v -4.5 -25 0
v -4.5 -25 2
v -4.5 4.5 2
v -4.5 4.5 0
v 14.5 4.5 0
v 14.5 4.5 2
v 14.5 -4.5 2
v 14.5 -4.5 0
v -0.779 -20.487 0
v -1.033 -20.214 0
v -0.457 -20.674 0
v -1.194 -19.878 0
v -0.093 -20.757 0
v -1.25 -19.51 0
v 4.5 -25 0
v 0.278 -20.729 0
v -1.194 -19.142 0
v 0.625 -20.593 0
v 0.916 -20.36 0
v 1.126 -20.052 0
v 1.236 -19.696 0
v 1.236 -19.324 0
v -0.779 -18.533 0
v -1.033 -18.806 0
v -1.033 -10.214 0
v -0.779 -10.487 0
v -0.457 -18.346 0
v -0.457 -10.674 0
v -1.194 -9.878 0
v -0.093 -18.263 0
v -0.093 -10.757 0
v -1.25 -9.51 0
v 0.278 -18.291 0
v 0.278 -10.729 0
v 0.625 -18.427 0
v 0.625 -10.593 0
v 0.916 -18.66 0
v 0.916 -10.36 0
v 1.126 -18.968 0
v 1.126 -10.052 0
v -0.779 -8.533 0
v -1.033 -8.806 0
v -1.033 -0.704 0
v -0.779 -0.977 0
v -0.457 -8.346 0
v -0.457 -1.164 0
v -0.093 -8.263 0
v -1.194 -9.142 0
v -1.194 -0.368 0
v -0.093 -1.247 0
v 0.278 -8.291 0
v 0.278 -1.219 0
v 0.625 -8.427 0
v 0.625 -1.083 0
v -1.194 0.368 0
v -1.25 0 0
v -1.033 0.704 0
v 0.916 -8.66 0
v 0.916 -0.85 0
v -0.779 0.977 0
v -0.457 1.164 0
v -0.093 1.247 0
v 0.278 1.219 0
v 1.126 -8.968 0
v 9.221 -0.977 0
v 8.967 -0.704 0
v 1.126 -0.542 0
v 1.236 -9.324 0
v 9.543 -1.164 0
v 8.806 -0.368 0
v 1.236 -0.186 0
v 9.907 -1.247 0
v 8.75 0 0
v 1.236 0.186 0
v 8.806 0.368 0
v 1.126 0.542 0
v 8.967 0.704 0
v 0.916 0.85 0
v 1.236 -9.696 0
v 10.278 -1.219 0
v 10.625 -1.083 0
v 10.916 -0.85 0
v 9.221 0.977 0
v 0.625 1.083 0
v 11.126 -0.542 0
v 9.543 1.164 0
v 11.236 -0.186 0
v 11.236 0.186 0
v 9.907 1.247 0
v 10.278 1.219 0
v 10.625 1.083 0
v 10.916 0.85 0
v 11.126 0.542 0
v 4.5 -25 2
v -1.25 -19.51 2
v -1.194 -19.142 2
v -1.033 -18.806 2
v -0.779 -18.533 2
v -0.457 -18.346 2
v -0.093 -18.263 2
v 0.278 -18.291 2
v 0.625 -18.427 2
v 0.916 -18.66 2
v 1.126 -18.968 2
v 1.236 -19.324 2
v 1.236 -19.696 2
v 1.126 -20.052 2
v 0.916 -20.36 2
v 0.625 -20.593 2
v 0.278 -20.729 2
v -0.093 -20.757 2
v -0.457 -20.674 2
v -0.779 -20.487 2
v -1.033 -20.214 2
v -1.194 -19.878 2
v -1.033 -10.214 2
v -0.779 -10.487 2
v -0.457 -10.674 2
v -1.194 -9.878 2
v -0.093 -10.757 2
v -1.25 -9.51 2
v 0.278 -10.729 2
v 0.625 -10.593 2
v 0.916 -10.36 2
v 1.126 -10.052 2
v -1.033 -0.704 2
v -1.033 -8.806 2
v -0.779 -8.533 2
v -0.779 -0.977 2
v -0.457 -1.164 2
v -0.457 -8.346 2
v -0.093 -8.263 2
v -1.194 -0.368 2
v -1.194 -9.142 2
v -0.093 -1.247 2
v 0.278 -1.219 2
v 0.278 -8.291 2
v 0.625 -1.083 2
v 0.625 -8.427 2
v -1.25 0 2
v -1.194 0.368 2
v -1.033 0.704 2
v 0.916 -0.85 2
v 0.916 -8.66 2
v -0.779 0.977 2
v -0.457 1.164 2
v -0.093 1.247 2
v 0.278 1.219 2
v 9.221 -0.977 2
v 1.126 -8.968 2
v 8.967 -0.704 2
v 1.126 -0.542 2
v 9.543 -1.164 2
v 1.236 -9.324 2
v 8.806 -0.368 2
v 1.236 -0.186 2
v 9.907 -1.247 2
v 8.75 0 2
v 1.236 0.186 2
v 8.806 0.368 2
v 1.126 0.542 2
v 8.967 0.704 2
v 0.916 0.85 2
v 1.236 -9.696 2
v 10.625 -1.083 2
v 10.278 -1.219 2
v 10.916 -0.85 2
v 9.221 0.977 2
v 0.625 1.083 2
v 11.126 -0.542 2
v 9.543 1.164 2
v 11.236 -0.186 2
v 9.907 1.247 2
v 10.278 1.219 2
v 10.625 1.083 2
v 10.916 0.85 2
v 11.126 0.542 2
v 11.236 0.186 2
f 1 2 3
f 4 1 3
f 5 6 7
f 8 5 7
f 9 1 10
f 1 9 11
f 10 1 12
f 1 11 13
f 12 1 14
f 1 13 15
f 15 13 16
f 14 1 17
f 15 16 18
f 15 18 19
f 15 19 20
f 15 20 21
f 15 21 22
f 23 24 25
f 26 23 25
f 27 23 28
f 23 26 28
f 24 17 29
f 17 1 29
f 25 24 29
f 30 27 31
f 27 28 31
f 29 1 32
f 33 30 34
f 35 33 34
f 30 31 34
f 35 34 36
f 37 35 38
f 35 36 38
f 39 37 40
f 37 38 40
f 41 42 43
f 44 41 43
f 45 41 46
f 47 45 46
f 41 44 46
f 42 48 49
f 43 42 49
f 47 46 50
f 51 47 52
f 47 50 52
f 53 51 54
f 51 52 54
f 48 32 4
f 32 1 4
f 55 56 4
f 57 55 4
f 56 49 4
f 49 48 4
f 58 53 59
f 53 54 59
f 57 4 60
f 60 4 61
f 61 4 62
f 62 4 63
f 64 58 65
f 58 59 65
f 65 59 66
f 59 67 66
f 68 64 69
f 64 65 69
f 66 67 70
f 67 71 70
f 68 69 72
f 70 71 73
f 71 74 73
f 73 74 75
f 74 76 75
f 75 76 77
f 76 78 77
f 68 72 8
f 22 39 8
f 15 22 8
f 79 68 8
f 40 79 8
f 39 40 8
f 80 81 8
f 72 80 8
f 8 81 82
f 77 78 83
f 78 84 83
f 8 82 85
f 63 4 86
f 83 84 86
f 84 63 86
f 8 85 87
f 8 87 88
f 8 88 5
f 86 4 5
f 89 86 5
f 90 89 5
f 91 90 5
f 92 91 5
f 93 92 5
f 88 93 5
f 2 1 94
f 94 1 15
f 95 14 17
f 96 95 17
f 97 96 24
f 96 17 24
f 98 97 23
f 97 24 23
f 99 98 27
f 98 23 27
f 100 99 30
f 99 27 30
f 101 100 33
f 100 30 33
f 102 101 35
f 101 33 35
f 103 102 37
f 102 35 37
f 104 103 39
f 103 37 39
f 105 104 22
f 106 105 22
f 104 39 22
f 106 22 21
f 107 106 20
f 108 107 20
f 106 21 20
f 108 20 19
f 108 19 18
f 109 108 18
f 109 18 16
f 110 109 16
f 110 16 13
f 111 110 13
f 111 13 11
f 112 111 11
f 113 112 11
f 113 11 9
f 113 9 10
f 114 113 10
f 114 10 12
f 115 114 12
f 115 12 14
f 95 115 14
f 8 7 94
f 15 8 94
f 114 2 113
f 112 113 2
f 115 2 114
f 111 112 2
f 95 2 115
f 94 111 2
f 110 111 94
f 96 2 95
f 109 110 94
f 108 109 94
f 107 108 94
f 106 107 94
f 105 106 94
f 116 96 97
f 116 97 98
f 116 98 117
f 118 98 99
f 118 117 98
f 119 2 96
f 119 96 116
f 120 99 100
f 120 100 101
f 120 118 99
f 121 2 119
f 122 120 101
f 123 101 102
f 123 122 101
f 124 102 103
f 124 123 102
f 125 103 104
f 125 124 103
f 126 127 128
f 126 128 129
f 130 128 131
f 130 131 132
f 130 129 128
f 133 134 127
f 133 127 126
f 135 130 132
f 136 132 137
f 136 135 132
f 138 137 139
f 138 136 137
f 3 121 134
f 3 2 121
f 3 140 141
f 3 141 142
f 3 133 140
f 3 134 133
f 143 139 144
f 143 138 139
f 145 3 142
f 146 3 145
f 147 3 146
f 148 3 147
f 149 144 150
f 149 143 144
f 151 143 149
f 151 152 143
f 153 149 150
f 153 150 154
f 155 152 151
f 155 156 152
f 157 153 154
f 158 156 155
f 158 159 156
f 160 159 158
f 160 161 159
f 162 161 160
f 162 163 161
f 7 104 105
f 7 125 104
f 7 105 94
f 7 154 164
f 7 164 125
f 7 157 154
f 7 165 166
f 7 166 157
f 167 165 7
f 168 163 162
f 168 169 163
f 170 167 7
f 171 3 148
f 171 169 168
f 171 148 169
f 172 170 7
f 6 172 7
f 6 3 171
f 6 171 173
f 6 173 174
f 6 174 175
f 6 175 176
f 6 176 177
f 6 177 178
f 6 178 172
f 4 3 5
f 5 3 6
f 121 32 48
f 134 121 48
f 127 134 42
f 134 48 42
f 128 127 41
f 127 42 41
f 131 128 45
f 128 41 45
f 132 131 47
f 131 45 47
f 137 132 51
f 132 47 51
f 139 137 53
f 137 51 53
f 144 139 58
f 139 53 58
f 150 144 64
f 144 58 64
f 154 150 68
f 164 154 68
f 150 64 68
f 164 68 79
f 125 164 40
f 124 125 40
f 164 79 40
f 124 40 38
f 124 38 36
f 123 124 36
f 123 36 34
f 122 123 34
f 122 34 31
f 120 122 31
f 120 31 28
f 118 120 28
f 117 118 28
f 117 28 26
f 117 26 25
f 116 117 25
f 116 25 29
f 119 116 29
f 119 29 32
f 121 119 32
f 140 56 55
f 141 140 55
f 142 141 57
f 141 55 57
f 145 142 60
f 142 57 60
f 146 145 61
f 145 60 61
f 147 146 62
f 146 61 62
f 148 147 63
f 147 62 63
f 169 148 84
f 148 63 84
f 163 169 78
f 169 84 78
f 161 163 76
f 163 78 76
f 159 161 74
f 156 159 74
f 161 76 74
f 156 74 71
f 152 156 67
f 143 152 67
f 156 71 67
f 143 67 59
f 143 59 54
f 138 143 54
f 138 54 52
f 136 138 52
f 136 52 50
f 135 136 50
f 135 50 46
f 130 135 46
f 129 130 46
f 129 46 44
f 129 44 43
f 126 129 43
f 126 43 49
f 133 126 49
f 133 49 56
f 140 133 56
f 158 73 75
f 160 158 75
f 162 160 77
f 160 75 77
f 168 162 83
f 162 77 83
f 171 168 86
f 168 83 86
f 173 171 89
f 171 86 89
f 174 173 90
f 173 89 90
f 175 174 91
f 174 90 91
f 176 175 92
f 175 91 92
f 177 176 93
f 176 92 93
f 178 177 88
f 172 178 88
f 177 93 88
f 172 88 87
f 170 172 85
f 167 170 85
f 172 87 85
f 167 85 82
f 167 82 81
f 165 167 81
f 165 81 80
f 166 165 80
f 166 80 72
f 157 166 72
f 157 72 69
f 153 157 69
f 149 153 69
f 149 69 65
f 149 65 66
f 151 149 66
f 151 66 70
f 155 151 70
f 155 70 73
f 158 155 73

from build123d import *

# Parameters (mm, degrees)
SKETCH_1_W          = 50
SKETCH_1_H          = 50
EXTRUDE_1_DEPTH     = 2
SKETCH_3_W          = 76.549088161
SKETCH_3_H          = 63.496312915
CUT_EXTRUDE_3_DEPTH = 10
M3X0_5_1_D          = 2.5
M3X0_5_1_DEPTH      = 8.5
M3X0_5_1_TIP        = 0.751075774


with BuildPart() as part:
    # ｽｹｯﾁ1 → ﾎﾞｽ - 押し出し1 (new body)
    with BuildSketch(Plane.XY):
        Rectangle(SKETCH_1_W, SKETCH_1_H)
    extrude(amount=EXTRUDE_1_DEPTH)

    # ｽｹｯﾁ3 → ｶｯﾄ - 押し出し3 (cut)
    with BuildSketch(Plane.XY.offset(2)):
        with Locations((-0.951764861, 3.501134841)):
            Rectangle(SKETCH_3_W, SKETCH_3_H)
        Polygon((14.5, -4.5), (4.5, -25), (-4.5, -25), (-4.5, 4.5), (14.5, 4.5), align=None, mode=Mode.SUBTRACT)
    extrude(amount=-CUT_EXTRUDE_3_DEPTH, mode=Mode.SUBTRACT)

    # M3x0.5 ねじ穴1
    with Locations(Plane.XY.offset(2)):
        with Locations((0, 0), (10, 0), (0, -9.51), (0, -19.51)):
            Hole(M3X0_5_1_D / 2, depth=M3X0_5_1_DEPTH)
            with Locations((0, 0, -(M3X0_5_1_DEPTH + M3X0_5_1_TIP / 2))):  # 118° drill point
                Cone(0, M3X0_5_1_D / 2, M3X0_5_1_TIP, mode=Mode.SUBTRACT)


solid = part.part
